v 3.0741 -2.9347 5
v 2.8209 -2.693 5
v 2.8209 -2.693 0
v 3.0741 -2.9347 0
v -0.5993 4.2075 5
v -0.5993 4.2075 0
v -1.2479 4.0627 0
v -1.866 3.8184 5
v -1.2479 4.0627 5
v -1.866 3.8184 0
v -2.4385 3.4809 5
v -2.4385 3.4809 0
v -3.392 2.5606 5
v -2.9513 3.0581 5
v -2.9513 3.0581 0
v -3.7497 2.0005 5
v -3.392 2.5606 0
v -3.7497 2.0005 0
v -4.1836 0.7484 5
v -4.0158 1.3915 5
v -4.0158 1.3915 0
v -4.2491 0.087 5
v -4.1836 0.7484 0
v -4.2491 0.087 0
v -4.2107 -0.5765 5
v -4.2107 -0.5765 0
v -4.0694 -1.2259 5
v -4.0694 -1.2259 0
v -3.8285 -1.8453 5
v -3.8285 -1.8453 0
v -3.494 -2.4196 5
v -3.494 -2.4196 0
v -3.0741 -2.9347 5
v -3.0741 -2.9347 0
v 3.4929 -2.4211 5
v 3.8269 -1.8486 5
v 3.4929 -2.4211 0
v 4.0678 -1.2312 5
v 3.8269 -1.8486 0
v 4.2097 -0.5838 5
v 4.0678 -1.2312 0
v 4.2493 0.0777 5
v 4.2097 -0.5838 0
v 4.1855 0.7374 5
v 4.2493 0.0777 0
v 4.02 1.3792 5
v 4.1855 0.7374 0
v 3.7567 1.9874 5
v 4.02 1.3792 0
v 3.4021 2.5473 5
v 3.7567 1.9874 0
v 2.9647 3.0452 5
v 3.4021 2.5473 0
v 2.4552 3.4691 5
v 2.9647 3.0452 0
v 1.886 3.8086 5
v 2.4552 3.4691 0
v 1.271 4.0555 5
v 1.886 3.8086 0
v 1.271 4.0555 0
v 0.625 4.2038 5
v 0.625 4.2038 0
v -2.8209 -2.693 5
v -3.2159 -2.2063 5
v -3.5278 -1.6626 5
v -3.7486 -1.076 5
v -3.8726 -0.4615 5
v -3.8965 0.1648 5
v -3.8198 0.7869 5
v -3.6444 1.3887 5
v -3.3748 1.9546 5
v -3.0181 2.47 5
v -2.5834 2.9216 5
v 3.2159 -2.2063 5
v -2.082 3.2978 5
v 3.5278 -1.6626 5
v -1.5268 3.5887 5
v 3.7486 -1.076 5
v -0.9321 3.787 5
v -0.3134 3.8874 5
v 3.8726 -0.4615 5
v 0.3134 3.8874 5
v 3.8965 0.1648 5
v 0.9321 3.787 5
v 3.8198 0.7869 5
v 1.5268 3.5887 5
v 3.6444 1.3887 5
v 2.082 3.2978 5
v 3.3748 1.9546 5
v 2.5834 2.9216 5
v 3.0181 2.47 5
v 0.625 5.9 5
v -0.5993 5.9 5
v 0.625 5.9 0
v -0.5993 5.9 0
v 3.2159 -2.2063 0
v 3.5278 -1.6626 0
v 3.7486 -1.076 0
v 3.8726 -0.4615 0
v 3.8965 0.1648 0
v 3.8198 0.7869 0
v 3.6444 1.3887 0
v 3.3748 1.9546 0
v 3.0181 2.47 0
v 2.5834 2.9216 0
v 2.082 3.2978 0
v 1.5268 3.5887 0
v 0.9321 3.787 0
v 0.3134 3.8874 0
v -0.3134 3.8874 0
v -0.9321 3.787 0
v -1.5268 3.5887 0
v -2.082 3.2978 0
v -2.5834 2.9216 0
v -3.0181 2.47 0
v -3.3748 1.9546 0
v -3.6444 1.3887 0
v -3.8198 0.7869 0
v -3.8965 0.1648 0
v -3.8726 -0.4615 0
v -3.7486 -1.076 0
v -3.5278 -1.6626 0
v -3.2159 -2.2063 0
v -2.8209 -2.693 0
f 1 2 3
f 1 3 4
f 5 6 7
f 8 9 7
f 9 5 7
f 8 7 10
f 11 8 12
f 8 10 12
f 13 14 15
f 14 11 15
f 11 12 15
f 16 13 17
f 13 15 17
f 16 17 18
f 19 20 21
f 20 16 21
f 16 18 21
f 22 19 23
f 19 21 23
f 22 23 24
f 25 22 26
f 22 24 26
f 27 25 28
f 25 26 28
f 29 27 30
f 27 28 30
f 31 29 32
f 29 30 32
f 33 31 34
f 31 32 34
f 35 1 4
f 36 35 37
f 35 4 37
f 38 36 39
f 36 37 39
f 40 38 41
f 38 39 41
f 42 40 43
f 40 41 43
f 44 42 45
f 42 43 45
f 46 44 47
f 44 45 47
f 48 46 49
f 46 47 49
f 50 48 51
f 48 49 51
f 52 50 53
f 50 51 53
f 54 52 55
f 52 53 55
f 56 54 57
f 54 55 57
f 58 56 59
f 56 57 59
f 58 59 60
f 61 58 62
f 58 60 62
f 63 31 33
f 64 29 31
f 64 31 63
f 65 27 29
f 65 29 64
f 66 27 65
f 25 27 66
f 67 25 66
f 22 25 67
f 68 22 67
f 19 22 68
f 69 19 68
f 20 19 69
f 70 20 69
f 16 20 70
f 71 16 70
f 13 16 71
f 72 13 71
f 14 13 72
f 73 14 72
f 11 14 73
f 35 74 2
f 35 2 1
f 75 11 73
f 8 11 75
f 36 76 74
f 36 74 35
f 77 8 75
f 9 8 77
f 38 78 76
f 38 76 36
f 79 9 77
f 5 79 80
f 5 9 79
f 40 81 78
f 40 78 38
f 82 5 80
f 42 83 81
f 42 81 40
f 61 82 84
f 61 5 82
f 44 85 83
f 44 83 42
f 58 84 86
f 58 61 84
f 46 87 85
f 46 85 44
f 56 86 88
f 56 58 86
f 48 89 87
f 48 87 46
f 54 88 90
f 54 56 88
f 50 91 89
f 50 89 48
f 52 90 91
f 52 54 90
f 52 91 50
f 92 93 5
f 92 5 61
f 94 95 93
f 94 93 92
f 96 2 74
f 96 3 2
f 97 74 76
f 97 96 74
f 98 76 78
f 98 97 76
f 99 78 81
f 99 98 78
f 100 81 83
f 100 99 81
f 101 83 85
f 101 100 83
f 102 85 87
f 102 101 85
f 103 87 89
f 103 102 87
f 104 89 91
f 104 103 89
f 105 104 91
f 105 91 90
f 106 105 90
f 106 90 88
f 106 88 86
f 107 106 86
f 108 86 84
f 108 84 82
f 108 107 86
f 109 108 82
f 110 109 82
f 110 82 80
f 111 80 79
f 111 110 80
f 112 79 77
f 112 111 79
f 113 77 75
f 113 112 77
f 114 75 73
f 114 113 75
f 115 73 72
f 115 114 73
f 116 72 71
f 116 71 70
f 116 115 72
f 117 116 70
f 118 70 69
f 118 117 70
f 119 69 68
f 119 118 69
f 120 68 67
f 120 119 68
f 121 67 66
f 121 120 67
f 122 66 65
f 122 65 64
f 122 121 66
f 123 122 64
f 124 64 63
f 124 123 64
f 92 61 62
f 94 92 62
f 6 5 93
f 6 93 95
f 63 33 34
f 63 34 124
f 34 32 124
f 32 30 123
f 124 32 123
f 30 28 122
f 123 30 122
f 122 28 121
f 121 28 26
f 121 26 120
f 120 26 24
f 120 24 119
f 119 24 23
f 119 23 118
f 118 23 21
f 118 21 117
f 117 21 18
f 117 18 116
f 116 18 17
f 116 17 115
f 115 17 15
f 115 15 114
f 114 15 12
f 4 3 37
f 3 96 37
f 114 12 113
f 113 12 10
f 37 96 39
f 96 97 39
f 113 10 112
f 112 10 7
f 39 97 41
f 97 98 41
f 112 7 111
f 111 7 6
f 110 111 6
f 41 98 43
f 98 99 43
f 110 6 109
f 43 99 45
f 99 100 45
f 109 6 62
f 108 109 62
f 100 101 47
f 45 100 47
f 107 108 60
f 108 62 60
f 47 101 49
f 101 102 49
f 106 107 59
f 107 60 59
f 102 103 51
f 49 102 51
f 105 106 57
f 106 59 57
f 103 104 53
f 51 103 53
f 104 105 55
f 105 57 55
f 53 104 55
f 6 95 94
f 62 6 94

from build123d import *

# Parameters (mm, degrees)
SKETCH1_R           = 4.25
SKETCH1_R_2         = 3.9
BOSS_EXTRUDE1_DEPTH = 5
CUT_EXTRUDE1_DEPTH  = 5
SKETCH3_W           = 1.224263259
SKETCH3_H           = 5
BOSS_EXTRUDE2_DEPTH = 2


with BuildPart() as part:
    # Sketch1 → Boss-Extrude1 (new body)
    with BuildSketch(Plane.XY):
        Circle(SKETCH1_R)
        Circle(SKETCH1_R_2, mode=Mode.SUBTRACT)
    extrude(amount=BOSS_EXTRUDE1_DEPTH)

    # Sketch2 → Cut-Extrude1 (cut)
    with BuildSketch(Plane.XY.offset(5)):
        with BuildLine():
            Line((-3.074069072, -2.934723044), (-2.820910442, -2.69303997))
            ThreePointArc((-2.820910442, -2.69303997), (0, -3.9), (2.820910442, -2.69303997))
            Line((2.820910442, -2.69303997), (3.074069072, -2.934723044))
            ThreePointArc((3.074069072, -2.934723044), (0, -4.25), (-3.074069072, -2.934723044))
        make_face()
    extrude(amount=-CUT_EXTRUDE1_DEPTH, mode=Mode.SUBTRACT)

    # Sketch3 → Boss-Extrude2 (add)
    with BuildSketch(Plane(origin=(0, 3.9, 0), x_dir=(1, 0, 0), z_dir=(0, 1, 0))):
        with Locations((0.012871952, -2.5)):
            Rectangle(SKETCH3_W, SKETCH3_H)
    extrude(amount=BOSS_EXTRUDE2_DEPTH)


solid = part.part
